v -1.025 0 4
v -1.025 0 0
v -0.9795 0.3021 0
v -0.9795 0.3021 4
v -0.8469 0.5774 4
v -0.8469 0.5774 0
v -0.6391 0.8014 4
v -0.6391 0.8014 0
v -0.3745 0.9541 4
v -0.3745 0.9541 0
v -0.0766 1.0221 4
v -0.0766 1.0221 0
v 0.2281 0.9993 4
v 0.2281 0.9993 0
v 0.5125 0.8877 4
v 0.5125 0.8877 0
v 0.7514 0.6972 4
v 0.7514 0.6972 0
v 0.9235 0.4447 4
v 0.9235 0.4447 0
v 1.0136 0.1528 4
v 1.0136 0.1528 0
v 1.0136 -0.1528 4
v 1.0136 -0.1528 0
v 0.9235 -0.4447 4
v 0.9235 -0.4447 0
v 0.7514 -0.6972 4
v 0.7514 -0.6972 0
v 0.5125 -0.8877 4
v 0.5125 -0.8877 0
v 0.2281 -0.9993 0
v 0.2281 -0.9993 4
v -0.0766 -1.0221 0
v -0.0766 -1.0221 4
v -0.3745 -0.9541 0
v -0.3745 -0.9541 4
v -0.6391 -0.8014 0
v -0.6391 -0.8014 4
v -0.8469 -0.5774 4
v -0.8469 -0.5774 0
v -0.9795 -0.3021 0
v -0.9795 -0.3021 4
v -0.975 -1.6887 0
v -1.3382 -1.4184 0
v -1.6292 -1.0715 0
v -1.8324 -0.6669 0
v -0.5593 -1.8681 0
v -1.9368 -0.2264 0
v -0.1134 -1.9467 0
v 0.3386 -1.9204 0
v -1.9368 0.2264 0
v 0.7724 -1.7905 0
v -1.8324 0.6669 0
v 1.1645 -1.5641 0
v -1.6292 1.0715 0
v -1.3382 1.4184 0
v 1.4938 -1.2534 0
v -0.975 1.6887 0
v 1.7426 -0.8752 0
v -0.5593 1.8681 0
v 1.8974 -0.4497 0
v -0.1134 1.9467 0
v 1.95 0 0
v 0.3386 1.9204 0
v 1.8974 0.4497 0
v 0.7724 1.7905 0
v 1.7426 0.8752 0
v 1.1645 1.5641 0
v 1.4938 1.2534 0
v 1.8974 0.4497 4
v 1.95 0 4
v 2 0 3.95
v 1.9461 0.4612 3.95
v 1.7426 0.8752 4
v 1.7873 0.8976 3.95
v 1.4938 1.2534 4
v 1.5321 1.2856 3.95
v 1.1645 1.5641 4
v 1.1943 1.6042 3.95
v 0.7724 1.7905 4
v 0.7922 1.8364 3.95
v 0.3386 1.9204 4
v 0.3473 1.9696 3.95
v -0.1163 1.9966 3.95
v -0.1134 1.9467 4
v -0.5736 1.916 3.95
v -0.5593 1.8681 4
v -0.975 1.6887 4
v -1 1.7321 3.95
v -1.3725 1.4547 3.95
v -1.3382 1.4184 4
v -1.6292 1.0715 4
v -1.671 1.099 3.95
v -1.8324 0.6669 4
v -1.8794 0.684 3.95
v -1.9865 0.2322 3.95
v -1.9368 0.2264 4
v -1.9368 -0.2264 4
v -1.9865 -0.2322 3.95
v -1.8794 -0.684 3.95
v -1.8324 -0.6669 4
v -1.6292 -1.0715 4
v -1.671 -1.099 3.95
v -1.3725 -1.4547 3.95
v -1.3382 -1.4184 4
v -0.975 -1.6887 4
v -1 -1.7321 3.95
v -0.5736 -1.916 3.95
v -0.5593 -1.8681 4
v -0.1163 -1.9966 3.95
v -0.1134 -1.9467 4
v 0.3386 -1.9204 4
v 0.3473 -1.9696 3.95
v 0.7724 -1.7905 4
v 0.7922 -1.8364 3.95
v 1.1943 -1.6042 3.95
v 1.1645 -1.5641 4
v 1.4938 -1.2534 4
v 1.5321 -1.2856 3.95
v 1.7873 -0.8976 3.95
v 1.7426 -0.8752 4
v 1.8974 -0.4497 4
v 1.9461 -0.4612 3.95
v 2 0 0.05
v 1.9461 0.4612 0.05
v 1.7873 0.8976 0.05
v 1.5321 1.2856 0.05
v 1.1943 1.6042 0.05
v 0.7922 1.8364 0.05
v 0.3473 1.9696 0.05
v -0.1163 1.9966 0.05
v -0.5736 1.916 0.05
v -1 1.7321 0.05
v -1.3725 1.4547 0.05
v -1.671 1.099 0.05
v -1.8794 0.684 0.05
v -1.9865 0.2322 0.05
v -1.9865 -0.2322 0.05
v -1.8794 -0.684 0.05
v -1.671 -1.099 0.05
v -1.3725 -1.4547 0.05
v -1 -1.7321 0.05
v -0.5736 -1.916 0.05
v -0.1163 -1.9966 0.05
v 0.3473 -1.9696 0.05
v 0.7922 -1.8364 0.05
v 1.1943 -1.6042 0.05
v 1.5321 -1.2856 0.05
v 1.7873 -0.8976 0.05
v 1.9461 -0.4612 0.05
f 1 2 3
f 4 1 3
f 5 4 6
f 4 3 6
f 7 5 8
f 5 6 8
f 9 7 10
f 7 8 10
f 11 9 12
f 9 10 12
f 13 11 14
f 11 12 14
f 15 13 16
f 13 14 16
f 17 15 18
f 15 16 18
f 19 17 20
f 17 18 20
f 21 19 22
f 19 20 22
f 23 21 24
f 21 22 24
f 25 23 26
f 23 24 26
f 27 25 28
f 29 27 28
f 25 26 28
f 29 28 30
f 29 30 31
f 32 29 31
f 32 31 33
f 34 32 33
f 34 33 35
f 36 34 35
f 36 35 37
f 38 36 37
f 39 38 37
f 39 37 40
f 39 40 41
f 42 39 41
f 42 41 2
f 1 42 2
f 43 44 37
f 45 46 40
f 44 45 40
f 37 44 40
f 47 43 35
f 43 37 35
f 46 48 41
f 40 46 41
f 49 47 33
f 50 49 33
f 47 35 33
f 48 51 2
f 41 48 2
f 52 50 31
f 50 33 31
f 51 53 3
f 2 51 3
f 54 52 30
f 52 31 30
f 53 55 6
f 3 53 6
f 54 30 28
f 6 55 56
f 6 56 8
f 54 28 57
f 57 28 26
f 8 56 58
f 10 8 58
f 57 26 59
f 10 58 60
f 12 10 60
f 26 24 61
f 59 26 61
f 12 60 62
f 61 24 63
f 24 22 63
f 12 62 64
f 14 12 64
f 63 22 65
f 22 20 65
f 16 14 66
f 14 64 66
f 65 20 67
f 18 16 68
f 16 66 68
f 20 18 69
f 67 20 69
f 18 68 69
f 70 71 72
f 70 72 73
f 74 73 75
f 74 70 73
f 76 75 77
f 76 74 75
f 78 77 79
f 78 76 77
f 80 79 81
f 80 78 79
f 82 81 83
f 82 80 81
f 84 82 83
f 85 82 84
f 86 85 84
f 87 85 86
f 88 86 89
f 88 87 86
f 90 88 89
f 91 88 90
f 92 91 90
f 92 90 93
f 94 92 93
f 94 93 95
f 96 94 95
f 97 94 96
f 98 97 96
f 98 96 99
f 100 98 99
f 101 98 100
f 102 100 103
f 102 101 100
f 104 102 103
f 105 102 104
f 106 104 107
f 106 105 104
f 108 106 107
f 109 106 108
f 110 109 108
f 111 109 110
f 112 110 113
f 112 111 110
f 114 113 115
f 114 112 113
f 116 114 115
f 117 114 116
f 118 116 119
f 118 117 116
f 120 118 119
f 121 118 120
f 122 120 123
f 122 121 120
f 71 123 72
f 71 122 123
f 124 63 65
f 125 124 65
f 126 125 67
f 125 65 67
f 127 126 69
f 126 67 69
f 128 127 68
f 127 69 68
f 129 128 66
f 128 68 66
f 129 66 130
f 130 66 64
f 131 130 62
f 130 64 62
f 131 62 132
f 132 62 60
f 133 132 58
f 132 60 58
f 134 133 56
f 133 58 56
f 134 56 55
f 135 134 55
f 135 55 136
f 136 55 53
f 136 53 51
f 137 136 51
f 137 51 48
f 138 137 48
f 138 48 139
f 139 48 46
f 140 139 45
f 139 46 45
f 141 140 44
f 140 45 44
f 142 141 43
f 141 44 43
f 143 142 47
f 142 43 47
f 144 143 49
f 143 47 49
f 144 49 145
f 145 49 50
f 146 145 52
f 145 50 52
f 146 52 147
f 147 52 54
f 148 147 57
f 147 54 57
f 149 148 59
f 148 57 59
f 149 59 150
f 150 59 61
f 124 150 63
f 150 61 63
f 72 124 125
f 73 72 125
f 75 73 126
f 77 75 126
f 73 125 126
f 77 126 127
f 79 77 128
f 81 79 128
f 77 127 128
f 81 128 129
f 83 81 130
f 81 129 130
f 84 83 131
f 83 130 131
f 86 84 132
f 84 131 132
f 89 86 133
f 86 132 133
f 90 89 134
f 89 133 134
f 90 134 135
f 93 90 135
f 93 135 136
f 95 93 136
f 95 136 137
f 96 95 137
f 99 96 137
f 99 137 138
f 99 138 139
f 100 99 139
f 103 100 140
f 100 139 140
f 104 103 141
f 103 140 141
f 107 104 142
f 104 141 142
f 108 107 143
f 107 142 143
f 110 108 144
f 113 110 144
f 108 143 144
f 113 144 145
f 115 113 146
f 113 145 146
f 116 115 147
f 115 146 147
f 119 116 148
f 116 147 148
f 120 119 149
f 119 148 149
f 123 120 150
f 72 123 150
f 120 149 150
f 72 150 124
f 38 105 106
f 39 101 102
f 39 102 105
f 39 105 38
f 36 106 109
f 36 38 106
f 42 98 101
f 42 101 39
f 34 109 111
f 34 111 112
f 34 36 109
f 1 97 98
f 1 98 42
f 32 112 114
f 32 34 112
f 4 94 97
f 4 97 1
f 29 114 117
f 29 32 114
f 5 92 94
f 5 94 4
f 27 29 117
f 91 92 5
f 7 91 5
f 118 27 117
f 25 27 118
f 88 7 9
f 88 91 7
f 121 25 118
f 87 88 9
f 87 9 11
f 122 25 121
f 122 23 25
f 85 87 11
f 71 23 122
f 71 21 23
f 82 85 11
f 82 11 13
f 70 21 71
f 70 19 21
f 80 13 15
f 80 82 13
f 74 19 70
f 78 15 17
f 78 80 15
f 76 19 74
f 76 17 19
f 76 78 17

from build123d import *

# Parameters (mm, degrees)
ESQUISSE1_R              = 2
ESQUISSE1_R_2            = 1.06
EXTRUSION1_DEPTH         = 4
CHANFREIN1_SIZE          = 0.05
SUPPRIMERFACE1_OUTLINE_R = 1.06
SUPPRIMERFACE1_DEPTH     = 4
TROU_TARAUD_M2_51_D      = 2.05


# Read off the part's stored shape, not the designer's step: SupprimerFace1
with BuildPart() as part:
    # Esquisse1 → Extrusion1 (new body)
    with BuildSketch(Plane.XY):
        Circle(ESQUISSE1_R)
        Circle(ESQUISSE1_R_2, mode=Mode.SUBTRACT)
    extrude(amount=EXTRUSION1_DEPTH)

    # Chanfrein1
    chanfrein1_edges = [part.edges().sort_by_distance(p)[0] for p in [
        (-2, 0, 0),
        (-2, 0, 4),
    ]]
    chamfer(chanfrein1_edges, length=CHANFREIN1_SIZE)

    # SupprimerFace1 outline → SupprimerFace1 (add)
    with BuildSketch(Plane.XY):
        Circle(SUPPRIMERFACE1_OUTLINE_R)
    extrude(amount=SUPPRIMERFACE1_DEPTH)

    # Trou taraudé M2.51 (through all)
    with Locations(Plane.XY.offset(4)):
        with Locations((0, 0)):
            Hole(TROU_TARAUD_M2_51_D / 2)


solid = part.part
